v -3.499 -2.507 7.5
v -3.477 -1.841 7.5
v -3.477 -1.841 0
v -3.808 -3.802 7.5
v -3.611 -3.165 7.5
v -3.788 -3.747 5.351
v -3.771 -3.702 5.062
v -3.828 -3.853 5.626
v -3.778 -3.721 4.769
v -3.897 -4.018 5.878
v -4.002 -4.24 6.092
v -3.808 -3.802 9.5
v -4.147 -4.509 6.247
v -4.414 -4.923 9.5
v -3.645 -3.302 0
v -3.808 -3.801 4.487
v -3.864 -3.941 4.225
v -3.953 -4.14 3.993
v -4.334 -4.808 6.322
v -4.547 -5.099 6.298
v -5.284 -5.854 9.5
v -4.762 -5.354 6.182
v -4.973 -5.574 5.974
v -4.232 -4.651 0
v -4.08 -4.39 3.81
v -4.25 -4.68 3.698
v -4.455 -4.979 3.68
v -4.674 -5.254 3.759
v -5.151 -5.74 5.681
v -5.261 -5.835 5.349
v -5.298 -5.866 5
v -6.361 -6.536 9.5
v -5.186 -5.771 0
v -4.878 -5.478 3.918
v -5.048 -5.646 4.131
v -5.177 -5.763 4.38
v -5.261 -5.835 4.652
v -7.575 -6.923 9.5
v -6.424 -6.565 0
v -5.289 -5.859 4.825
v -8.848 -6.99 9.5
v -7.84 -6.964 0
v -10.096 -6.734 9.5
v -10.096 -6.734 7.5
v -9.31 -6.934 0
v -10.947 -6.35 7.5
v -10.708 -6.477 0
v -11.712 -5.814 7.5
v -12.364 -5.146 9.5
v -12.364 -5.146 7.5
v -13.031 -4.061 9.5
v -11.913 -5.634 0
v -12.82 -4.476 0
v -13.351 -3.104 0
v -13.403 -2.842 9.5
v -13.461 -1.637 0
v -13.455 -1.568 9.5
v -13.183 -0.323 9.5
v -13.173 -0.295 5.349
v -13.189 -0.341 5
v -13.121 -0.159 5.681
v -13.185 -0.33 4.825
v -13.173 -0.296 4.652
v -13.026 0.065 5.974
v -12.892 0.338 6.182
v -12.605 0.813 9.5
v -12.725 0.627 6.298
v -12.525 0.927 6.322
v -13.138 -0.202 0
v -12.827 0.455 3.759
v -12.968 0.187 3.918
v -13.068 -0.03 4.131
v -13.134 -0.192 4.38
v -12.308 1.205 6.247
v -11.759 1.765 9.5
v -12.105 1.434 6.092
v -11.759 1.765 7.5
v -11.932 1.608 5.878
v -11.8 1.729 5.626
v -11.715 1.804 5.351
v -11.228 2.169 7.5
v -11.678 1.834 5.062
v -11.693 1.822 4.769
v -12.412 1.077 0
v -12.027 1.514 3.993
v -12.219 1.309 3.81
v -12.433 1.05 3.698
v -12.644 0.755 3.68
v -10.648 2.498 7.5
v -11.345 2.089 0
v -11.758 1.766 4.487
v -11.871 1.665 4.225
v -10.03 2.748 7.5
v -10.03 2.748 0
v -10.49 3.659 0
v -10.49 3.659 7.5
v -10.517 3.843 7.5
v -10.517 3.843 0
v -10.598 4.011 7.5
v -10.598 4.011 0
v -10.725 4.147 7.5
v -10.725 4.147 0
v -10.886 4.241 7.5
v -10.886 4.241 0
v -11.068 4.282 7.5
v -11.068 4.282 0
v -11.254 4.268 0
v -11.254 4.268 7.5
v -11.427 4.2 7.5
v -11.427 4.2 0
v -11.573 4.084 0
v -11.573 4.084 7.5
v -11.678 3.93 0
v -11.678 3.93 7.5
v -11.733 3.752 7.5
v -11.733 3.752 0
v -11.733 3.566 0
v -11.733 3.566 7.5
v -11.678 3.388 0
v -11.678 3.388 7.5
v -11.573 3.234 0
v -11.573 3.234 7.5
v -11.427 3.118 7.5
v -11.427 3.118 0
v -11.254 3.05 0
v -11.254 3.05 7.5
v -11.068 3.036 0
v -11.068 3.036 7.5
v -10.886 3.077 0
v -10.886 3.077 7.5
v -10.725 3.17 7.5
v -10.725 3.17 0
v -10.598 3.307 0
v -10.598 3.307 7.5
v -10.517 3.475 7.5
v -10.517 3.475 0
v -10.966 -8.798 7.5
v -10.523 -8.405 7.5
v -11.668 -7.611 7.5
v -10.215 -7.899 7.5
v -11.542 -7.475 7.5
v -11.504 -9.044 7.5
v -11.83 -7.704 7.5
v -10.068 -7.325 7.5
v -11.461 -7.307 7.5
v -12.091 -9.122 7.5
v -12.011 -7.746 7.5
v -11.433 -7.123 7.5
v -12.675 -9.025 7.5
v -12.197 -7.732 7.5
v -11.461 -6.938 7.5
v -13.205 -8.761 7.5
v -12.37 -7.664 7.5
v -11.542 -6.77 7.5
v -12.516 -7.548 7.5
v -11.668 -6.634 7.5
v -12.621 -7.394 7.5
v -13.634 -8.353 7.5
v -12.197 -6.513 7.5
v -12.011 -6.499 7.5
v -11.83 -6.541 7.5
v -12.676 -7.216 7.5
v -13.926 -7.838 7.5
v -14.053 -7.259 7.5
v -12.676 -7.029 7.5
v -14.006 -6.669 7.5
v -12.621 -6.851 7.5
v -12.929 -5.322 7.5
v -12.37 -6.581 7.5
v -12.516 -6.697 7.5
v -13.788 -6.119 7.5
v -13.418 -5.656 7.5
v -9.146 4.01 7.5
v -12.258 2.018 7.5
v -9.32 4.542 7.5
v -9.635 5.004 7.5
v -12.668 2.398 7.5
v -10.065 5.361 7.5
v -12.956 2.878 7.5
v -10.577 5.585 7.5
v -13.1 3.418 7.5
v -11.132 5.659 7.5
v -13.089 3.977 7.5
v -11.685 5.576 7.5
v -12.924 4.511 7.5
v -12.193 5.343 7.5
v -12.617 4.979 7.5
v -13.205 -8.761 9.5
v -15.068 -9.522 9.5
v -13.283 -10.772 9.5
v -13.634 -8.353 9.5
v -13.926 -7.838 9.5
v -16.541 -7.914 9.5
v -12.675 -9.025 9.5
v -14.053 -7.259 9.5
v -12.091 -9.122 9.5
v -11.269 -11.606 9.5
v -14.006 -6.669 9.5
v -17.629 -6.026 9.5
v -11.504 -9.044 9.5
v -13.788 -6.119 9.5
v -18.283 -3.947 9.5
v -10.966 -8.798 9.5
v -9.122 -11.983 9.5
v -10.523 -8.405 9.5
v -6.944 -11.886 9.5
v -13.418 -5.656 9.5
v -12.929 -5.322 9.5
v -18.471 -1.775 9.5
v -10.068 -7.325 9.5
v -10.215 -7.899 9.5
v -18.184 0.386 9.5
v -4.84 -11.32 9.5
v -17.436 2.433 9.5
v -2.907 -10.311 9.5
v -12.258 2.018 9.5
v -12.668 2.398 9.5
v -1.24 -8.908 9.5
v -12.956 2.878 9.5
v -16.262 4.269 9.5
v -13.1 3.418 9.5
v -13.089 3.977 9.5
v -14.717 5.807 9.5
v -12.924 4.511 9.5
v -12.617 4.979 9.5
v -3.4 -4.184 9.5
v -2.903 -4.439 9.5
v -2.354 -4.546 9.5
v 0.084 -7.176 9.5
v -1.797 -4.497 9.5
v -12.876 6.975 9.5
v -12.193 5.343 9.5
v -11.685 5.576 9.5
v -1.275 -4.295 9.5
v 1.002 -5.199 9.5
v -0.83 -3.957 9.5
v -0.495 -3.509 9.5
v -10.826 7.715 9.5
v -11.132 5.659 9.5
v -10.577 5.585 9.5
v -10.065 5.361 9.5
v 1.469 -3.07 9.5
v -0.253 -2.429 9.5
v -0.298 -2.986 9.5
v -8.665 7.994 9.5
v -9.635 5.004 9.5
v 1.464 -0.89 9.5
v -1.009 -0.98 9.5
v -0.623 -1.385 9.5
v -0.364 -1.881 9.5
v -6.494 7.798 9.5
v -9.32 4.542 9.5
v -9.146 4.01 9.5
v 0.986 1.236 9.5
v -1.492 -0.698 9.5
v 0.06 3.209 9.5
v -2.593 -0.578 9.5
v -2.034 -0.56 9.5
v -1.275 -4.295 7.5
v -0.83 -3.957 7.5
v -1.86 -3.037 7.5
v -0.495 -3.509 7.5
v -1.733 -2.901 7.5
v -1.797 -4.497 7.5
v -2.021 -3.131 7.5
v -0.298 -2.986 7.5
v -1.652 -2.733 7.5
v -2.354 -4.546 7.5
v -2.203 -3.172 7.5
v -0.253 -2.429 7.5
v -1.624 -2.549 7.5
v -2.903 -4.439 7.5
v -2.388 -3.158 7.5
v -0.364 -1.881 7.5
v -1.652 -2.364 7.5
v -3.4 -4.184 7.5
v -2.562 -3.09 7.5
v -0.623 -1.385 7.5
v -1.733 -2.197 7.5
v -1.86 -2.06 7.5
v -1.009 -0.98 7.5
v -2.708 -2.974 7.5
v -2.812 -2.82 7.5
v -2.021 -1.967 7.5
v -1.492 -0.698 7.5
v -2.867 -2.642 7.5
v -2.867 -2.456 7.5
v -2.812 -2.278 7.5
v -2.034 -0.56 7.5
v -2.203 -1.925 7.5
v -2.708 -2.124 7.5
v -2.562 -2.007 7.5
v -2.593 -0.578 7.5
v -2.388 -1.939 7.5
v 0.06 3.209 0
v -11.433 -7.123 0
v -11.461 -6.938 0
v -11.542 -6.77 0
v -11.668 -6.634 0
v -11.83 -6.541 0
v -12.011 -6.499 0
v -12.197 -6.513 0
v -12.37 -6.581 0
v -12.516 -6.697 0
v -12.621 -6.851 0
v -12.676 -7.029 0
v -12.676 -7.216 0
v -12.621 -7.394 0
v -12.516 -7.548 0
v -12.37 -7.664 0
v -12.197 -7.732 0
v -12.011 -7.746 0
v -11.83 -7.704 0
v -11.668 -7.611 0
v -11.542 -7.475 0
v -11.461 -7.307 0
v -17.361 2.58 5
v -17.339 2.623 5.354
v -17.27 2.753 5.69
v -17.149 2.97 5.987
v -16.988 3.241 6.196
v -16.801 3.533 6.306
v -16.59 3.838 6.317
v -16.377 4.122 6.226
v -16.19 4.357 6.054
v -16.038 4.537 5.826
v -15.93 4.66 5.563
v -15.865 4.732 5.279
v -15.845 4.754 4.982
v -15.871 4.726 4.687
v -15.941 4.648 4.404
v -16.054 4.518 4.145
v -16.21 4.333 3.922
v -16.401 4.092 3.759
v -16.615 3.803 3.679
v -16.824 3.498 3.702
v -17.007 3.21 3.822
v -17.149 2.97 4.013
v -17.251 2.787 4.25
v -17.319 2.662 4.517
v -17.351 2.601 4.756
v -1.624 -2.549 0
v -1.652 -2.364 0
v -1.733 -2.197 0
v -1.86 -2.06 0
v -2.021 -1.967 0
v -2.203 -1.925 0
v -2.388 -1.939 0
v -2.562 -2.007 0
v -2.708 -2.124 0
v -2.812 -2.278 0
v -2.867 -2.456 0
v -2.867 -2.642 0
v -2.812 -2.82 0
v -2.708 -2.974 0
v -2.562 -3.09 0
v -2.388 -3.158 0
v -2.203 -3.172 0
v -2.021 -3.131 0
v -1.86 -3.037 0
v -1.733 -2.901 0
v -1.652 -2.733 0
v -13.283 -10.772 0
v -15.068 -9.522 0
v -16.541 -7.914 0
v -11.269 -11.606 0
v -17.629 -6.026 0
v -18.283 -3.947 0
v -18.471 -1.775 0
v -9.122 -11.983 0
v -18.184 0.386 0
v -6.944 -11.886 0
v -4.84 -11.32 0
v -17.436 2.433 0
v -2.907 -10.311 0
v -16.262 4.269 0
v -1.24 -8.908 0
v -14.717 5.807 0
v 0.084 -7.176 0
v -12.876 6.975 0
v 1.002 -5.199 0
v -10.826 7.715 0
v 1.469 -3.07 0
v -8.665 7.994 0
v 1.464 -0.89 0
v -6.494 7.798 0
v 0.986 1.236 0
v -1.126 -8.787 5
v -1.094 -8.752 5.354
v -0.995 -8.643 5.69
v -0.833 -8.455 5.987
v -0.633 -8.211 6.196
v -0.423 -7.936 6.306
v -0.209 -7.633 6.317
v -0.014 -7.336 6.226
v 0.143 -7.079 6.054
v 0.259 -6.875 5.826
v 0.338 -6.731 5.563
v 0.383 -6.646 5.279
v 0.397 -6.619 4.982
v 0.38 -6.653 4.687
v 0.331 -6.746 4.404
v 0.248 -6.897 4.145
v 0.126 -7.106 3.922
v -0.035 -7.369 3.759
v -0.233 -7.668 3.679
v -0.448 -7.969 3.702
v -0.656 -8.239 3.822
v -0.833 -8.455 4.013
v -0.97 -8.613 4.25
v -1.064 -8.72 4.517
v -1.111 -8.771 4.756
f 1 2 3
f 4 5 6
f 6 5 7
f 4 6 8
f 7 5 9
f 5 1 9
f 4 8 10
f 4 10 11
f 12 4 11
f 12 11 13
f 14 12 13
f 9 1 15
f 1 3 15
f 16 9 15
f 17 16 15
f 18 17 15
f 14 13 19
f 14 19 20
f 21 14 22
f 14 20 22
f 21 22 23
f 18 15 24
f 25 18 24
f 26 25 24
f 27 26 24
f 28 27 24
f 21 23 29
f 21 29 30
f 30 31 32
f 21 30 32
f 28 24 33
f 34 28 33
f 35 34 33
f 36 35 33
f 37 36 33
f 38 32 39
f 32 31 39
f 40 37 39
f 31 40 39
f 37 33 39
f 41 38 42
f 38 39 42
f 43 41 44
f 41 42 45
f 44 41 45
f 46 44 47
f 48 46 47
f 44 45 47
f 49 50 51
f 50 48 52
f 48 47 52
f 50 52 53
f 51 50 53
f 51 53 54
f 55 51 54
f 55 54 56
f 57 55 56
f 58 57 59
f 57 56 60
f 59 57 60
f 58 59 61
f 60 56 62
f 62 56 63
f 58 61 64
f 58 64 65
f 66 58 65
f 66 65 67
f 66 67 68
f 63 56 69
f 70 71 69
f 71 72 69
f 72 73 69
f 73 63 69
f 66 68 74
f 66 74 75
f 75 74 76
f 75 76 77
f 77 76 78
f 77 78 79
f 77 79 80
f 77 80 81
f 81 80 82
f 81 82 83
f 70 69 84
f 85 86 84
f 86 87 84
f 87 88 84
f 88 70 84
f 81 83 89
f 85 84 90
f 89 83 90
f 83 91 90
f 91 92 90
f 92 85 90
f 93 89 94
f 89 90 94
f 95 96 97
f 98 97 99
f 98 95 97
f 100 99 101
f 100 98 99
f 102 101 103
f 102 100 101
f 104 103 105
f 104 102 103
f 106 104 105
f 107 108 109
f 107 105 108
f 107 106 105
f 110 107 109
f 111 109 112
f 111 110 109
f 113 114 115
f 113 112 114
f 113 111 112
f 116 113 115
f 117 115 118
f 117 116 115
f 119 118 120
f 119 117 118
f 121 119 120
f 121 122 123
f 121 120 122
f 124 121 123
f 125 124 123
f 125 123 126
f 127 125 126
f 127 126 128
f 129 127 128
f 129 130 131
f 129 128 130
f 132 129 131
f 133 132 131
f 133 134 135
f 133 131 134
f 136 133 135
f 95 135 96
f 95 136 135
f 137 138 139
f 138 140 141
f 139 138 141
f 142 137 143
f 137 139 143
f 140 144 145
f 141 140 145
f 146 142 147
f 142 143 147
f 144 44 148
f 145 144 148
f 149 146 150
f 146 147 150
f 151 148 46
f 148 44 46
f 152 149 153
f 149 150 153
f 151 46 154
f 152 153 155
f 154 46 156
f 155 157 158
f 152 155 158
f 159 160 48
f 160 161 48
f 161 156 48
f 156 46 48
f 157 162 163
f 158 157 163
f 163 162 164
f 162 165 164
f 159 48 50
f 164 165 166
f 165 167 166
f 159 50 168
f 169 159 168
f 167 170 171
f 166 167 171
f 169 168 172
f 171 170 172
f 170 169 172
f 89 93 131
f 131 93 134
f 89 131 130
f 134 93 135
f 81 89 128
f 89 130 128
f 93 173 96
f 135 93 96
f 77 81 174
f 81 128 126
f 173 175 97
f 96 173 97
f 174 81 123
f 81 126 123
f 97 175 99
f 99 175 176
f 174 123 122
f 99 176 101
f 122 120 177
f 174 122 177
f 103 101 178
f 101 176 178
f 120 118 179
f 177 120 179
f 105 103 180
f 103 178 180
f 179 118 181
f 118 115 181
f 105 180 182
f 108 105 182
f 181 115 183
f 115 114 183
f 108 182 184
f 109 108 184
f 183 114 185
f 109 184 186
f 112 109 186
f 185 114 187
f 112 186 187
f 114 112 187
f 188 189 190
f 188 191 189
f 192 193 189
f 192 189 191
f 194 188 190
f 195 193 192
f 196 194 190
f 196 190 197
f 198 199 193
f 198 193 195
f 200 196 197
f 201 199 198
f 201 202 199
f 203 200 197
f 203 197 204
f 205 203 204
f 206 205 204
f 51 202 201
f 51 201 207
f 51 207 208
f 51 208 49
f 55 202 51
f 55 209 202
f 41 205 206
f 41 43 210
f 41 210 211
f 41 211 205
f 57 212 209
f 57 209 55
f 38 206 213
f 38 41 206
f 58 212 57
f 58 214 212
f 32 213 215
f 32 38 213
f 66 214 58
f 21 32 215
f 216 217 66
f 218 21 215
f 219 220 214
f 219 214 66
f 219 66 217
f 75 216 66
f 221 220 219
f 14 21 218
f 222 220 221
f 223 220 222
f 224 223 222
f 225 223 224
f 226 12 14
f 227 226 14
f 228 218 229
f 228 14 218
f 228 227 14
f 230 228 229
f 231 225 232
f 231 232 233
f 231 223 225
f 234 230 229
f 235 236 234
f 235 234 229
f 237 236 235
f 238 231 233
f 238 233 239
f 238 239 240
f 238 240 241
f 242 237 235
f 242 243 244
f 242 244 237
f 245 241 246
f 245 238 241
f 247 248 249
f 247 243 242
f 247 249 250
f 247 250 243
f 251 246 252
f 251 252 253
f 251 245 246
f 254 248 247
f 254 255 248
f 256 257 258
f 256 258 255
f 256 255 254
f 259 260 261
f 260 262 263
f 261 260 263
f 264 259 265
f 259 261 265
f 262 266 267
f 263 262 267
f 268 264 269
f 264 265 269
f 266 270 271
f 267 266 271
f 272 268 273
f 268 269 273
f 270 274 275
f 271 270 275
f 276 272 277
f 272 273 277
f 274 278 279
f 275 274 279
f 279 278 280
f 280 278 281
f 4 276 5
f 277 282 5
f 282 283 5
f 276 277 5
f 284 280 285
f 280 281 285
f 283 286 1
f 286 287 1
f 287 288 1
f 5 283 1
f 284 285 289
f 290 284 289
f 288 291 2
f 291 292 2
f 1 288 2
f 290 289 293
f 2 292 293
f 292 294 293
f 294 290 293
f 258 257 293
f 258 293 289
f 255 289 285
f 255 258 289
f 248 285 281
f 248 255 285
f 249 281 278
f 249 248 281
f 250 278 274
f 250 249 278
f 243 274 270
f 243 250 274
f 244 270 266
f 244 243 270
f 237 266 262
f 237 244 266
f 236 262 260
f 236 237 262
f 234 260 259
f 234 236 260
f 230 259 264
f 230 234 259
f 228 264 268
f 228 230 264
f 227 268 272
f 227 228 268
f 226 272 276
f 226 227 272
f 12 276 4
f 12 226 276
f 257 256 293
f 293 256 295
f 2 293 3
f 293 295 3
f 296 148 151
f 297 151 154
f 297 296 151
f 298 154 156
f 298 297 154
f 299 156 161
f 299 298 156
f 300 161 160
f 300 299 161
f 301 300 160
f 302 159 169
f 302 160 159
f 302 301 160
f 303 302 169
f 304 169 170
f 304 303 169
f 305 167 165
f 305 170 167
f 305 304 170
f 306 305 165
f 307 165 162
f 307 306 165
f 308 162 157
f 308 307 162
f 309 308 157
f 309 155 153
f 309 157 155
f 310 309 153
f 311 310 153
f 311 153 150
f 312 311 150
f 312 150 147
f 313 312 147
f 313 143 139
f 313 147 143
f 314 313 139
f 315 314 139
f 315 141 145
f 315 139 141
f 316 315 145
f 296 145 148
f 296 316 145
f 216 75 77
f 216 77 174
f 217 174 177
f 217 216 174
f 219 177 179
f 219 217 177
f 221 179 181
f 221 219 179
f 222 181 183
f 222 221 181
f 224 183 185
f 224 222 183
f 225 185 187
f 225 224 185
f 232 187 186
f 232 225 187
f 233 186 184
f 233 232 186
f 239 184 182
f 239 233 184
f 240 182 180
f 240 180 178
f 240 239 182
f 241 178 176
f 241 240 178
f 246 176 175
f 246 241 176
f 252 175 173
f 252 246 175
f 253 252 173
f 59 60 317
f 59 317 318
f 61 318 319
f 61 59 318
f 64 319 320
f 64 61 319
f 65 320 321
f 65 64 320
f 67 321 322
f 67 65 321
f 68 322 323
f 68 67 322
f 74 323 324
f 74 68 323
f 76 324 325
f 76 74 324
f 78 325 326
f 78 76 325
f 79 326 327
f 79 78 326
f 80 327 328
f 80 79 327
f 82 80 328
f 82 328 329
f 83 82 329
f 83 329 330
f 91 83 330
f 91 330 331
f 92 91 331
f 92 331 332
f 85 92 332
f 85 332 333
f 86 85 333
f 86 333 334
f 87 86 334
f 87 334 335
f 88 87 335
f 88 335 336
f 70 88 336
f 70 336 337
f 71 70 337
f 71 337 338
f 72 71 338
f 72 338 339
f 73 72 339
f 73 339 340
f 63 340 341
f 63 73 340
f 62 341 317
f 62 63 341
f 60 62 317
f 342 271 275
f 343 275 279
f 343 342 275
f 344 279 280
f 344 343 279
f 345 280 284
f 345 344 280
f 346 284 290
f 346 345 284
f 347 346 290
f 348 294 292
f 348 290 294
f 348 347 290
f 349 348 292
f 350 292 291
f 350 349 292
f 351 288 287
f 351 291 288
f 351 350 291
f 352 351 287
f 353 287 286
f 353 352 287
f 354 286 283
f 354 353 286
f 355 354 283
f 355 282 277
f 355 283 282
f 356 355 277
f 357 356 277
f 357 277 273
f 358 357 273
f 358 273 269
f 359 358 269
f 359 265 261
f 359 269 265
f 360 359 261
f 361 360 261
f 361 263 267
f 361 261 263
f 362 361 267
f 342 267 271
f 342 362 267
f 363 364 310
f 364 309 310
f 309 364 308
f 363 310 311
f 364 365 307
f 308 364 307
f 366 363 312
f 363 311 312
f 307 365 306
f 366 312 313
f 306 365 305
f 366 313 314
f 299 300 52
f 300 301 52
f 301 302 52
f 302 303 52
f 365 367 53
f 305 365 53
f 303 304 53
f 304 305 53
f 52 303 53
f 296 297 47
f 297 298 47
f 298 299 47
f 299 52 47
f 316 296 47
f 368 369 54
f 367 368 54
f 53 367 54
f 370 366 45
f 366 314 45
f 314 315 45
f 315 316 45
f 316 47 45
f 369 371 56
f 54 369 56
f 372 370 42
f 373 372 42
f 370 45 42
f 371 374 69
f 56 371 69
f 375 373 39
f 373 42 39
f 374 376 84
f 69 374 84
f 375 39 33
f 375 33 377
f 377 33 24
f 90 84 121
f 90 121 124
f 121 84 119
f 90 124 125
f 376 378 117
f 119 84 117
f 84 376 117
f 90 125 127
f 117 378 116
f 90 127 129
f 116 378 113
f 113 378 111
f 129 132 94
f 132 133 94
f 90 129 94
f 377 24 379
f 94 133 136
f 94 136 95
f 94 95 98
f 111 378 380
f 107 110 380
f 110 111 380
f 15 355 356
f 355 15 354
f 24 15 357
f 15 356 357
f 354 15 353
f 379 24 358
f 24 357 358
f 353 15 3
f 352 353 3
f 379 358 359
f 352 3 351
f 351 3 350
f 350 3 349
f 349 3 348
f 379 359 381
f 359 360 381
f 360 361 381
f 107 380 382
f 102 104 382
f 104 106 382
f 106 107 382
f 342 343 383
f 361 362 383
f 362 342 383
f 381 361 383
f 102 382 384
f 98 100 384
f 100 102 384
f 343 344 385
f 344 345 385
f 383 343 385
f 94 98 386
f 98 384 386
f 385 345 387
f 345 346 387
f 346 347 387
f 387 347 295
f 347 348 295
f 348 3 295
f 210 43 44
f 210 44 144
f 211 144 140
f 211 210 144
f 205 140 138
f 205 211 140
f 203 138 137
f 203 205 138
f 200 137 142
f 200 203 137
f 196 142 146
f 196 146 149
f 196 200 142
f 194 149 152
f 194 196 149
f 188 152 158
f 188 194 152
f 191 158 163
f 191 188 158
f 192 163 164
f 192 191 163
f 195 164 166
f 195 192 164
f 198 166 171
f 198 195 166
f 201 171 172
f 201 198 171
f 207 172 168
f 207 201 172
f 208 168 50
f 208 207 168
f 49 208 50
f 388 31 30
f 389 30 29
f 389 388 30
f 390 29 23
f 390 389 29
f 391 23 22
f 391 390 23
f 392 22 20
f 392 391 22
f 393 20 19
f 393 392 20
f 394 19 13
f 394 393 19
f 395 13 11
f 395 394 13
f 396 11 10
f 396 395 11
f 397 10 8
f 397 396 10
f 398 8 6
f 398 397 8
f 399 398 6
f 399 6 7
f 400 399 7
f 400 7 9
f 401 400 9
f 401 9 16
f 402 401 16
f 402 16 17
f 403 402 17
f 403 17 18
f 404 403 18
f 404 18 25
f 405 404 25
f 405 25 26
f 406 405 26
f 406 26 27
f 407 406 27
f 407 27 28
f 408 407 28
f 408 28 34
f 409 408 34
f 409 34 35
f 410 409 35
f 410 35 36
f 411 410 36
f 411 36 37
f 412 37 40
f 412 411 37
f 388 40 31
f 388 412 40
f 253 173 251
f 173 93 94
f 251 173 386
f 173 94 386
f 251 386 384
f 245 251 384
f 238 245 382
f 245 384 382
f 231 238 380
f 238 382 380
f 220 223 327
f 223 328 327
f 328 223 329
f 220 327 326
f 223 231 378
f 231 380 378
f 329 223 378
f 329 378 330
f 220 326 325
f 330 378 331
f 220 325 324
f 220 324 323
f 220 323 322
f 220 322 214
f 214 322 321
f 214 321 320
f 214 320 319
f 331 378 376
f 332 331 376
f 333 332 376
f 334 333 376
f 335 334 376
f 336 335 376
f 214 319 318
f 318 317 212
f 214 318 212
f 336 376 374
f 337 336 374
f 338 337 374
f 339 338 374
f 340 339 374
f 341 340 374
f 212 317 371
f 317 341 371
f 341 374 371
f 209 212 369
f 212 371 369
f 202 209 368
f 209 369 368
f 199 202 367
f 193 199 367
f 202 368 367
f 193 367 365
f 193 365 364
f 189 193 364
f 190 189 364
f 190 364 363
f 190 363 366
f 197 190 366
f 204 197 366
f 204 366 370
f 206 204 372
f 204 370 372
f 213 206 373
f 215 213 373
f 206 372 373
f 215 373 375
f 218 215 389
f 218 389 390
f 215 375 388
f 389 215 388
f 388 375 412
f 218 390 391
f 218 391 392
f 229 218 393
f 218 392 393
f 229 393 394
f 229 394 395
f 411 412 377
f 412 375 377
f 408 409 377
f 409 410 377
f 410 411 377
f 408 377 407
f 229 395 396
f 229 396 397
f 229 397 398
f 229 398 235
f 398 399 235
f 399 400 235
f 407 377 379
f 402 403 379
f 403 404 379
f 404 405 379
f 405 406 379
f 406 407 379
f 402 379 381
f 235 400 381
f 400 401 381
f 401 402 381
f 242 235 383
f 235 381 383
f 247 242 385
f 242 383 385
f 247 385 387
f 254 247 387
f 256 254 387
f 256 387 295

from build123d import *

# Parameters (mm, degrees)
SKETCH1_R               = 0.625
BOSS_EXTRUDE1_DEPTH     = 9.5
CUT_EXTRUDE1_DEPTH      = 28.258192056
CUT_EXTRUDE1_DEPTH_BACK = 28.258192056
SKETCH3_R               = 1.325
CUT_EXTRUDE2_START      = -9.5
SKETCH6_R               = 2
CUT_EXTRUDE2_DEPTH      = 2


with BuildPart() as part:
    # Sketch1 → Boss-Extrude1 (new body)
    with BuildSketch(Plane.XY):
        with BuildLine():
            Line((-10.029848506, 2.747640173), (-6.493662943, 7.797836537))
            ThreePointArc((-6.493662943, 7.797836537), (-14.209734002, -10.195642148), (0.059553412, 3.209225046))
            Line((0.059553412, 3.209225046), (-3.476632152, -1.840971318))
            ThreePointArc((-3.476632152, -1.840971318), (-11.34185182, -6.099881927), (-10.029848506, 2.747640173))
        make_face()
        with Locations((-11.114657585, 3.658851871)):
            Circle(SKETCH1_R, mode=Mode.SUBTRACT)
        with Locations((-2.249346687, -2.548705649)):
            Circle(SKETCH1_R, mode=Mode.SUBTRACT)
        with Locations((-12.057904643, -7.122511339)):
            Circle(SKETCH1_R, mode=Mode.SUBTRACT)
    extrude(amount=BOSS_EXTRUDE1_DEPTH)

    # Sketch3 → Cut-Extrude1 (cut, two sides: drawn at the far end of the back side and taken through both)
    with BuildSketch(Plane(origin=(-12.936010228, 9.057891876, 0), x_dir=(0, 0, 1), z_dir=(-0.8191520442889951, 0.5735764363510415, 0)).offset(-CUT_EXTRUDE1_DEPTH_BACK)):
        with Locations(Location((5, -6.519345212, 0), (0, 0, 270))):
            Circle(SKETCH3_R)
    extrude(amount=CUT_EXTRUDE1_DEPTH + CUT_EXTRUDE1_DEPTH_BACK, mode=Mode.SUBTRACT)

    # Sketch6 → Cut-Extrude2 (cut)
    with BuildSketch(Plane(origin=(0, 0, 0), x_dir=(-1, 0, 0), z_dir=(0, 0, -1)).offset(CUT_EXTRUDE2_START)):
        with Locations((11.114657585, 3.658851871)):
            Circle(SKETCH6_R)
        with Locations((12.057904643, -7.122511339)):
            Circle(SKETCH6_R)
        with Locations((2.249346687, -2.548705649)):
            Circle(SKETCH6_R)
    extrude(amount=CUT_EXTRUDE2_DEPTH, mode=Mode.SUBTRACT)


solid = part.part
